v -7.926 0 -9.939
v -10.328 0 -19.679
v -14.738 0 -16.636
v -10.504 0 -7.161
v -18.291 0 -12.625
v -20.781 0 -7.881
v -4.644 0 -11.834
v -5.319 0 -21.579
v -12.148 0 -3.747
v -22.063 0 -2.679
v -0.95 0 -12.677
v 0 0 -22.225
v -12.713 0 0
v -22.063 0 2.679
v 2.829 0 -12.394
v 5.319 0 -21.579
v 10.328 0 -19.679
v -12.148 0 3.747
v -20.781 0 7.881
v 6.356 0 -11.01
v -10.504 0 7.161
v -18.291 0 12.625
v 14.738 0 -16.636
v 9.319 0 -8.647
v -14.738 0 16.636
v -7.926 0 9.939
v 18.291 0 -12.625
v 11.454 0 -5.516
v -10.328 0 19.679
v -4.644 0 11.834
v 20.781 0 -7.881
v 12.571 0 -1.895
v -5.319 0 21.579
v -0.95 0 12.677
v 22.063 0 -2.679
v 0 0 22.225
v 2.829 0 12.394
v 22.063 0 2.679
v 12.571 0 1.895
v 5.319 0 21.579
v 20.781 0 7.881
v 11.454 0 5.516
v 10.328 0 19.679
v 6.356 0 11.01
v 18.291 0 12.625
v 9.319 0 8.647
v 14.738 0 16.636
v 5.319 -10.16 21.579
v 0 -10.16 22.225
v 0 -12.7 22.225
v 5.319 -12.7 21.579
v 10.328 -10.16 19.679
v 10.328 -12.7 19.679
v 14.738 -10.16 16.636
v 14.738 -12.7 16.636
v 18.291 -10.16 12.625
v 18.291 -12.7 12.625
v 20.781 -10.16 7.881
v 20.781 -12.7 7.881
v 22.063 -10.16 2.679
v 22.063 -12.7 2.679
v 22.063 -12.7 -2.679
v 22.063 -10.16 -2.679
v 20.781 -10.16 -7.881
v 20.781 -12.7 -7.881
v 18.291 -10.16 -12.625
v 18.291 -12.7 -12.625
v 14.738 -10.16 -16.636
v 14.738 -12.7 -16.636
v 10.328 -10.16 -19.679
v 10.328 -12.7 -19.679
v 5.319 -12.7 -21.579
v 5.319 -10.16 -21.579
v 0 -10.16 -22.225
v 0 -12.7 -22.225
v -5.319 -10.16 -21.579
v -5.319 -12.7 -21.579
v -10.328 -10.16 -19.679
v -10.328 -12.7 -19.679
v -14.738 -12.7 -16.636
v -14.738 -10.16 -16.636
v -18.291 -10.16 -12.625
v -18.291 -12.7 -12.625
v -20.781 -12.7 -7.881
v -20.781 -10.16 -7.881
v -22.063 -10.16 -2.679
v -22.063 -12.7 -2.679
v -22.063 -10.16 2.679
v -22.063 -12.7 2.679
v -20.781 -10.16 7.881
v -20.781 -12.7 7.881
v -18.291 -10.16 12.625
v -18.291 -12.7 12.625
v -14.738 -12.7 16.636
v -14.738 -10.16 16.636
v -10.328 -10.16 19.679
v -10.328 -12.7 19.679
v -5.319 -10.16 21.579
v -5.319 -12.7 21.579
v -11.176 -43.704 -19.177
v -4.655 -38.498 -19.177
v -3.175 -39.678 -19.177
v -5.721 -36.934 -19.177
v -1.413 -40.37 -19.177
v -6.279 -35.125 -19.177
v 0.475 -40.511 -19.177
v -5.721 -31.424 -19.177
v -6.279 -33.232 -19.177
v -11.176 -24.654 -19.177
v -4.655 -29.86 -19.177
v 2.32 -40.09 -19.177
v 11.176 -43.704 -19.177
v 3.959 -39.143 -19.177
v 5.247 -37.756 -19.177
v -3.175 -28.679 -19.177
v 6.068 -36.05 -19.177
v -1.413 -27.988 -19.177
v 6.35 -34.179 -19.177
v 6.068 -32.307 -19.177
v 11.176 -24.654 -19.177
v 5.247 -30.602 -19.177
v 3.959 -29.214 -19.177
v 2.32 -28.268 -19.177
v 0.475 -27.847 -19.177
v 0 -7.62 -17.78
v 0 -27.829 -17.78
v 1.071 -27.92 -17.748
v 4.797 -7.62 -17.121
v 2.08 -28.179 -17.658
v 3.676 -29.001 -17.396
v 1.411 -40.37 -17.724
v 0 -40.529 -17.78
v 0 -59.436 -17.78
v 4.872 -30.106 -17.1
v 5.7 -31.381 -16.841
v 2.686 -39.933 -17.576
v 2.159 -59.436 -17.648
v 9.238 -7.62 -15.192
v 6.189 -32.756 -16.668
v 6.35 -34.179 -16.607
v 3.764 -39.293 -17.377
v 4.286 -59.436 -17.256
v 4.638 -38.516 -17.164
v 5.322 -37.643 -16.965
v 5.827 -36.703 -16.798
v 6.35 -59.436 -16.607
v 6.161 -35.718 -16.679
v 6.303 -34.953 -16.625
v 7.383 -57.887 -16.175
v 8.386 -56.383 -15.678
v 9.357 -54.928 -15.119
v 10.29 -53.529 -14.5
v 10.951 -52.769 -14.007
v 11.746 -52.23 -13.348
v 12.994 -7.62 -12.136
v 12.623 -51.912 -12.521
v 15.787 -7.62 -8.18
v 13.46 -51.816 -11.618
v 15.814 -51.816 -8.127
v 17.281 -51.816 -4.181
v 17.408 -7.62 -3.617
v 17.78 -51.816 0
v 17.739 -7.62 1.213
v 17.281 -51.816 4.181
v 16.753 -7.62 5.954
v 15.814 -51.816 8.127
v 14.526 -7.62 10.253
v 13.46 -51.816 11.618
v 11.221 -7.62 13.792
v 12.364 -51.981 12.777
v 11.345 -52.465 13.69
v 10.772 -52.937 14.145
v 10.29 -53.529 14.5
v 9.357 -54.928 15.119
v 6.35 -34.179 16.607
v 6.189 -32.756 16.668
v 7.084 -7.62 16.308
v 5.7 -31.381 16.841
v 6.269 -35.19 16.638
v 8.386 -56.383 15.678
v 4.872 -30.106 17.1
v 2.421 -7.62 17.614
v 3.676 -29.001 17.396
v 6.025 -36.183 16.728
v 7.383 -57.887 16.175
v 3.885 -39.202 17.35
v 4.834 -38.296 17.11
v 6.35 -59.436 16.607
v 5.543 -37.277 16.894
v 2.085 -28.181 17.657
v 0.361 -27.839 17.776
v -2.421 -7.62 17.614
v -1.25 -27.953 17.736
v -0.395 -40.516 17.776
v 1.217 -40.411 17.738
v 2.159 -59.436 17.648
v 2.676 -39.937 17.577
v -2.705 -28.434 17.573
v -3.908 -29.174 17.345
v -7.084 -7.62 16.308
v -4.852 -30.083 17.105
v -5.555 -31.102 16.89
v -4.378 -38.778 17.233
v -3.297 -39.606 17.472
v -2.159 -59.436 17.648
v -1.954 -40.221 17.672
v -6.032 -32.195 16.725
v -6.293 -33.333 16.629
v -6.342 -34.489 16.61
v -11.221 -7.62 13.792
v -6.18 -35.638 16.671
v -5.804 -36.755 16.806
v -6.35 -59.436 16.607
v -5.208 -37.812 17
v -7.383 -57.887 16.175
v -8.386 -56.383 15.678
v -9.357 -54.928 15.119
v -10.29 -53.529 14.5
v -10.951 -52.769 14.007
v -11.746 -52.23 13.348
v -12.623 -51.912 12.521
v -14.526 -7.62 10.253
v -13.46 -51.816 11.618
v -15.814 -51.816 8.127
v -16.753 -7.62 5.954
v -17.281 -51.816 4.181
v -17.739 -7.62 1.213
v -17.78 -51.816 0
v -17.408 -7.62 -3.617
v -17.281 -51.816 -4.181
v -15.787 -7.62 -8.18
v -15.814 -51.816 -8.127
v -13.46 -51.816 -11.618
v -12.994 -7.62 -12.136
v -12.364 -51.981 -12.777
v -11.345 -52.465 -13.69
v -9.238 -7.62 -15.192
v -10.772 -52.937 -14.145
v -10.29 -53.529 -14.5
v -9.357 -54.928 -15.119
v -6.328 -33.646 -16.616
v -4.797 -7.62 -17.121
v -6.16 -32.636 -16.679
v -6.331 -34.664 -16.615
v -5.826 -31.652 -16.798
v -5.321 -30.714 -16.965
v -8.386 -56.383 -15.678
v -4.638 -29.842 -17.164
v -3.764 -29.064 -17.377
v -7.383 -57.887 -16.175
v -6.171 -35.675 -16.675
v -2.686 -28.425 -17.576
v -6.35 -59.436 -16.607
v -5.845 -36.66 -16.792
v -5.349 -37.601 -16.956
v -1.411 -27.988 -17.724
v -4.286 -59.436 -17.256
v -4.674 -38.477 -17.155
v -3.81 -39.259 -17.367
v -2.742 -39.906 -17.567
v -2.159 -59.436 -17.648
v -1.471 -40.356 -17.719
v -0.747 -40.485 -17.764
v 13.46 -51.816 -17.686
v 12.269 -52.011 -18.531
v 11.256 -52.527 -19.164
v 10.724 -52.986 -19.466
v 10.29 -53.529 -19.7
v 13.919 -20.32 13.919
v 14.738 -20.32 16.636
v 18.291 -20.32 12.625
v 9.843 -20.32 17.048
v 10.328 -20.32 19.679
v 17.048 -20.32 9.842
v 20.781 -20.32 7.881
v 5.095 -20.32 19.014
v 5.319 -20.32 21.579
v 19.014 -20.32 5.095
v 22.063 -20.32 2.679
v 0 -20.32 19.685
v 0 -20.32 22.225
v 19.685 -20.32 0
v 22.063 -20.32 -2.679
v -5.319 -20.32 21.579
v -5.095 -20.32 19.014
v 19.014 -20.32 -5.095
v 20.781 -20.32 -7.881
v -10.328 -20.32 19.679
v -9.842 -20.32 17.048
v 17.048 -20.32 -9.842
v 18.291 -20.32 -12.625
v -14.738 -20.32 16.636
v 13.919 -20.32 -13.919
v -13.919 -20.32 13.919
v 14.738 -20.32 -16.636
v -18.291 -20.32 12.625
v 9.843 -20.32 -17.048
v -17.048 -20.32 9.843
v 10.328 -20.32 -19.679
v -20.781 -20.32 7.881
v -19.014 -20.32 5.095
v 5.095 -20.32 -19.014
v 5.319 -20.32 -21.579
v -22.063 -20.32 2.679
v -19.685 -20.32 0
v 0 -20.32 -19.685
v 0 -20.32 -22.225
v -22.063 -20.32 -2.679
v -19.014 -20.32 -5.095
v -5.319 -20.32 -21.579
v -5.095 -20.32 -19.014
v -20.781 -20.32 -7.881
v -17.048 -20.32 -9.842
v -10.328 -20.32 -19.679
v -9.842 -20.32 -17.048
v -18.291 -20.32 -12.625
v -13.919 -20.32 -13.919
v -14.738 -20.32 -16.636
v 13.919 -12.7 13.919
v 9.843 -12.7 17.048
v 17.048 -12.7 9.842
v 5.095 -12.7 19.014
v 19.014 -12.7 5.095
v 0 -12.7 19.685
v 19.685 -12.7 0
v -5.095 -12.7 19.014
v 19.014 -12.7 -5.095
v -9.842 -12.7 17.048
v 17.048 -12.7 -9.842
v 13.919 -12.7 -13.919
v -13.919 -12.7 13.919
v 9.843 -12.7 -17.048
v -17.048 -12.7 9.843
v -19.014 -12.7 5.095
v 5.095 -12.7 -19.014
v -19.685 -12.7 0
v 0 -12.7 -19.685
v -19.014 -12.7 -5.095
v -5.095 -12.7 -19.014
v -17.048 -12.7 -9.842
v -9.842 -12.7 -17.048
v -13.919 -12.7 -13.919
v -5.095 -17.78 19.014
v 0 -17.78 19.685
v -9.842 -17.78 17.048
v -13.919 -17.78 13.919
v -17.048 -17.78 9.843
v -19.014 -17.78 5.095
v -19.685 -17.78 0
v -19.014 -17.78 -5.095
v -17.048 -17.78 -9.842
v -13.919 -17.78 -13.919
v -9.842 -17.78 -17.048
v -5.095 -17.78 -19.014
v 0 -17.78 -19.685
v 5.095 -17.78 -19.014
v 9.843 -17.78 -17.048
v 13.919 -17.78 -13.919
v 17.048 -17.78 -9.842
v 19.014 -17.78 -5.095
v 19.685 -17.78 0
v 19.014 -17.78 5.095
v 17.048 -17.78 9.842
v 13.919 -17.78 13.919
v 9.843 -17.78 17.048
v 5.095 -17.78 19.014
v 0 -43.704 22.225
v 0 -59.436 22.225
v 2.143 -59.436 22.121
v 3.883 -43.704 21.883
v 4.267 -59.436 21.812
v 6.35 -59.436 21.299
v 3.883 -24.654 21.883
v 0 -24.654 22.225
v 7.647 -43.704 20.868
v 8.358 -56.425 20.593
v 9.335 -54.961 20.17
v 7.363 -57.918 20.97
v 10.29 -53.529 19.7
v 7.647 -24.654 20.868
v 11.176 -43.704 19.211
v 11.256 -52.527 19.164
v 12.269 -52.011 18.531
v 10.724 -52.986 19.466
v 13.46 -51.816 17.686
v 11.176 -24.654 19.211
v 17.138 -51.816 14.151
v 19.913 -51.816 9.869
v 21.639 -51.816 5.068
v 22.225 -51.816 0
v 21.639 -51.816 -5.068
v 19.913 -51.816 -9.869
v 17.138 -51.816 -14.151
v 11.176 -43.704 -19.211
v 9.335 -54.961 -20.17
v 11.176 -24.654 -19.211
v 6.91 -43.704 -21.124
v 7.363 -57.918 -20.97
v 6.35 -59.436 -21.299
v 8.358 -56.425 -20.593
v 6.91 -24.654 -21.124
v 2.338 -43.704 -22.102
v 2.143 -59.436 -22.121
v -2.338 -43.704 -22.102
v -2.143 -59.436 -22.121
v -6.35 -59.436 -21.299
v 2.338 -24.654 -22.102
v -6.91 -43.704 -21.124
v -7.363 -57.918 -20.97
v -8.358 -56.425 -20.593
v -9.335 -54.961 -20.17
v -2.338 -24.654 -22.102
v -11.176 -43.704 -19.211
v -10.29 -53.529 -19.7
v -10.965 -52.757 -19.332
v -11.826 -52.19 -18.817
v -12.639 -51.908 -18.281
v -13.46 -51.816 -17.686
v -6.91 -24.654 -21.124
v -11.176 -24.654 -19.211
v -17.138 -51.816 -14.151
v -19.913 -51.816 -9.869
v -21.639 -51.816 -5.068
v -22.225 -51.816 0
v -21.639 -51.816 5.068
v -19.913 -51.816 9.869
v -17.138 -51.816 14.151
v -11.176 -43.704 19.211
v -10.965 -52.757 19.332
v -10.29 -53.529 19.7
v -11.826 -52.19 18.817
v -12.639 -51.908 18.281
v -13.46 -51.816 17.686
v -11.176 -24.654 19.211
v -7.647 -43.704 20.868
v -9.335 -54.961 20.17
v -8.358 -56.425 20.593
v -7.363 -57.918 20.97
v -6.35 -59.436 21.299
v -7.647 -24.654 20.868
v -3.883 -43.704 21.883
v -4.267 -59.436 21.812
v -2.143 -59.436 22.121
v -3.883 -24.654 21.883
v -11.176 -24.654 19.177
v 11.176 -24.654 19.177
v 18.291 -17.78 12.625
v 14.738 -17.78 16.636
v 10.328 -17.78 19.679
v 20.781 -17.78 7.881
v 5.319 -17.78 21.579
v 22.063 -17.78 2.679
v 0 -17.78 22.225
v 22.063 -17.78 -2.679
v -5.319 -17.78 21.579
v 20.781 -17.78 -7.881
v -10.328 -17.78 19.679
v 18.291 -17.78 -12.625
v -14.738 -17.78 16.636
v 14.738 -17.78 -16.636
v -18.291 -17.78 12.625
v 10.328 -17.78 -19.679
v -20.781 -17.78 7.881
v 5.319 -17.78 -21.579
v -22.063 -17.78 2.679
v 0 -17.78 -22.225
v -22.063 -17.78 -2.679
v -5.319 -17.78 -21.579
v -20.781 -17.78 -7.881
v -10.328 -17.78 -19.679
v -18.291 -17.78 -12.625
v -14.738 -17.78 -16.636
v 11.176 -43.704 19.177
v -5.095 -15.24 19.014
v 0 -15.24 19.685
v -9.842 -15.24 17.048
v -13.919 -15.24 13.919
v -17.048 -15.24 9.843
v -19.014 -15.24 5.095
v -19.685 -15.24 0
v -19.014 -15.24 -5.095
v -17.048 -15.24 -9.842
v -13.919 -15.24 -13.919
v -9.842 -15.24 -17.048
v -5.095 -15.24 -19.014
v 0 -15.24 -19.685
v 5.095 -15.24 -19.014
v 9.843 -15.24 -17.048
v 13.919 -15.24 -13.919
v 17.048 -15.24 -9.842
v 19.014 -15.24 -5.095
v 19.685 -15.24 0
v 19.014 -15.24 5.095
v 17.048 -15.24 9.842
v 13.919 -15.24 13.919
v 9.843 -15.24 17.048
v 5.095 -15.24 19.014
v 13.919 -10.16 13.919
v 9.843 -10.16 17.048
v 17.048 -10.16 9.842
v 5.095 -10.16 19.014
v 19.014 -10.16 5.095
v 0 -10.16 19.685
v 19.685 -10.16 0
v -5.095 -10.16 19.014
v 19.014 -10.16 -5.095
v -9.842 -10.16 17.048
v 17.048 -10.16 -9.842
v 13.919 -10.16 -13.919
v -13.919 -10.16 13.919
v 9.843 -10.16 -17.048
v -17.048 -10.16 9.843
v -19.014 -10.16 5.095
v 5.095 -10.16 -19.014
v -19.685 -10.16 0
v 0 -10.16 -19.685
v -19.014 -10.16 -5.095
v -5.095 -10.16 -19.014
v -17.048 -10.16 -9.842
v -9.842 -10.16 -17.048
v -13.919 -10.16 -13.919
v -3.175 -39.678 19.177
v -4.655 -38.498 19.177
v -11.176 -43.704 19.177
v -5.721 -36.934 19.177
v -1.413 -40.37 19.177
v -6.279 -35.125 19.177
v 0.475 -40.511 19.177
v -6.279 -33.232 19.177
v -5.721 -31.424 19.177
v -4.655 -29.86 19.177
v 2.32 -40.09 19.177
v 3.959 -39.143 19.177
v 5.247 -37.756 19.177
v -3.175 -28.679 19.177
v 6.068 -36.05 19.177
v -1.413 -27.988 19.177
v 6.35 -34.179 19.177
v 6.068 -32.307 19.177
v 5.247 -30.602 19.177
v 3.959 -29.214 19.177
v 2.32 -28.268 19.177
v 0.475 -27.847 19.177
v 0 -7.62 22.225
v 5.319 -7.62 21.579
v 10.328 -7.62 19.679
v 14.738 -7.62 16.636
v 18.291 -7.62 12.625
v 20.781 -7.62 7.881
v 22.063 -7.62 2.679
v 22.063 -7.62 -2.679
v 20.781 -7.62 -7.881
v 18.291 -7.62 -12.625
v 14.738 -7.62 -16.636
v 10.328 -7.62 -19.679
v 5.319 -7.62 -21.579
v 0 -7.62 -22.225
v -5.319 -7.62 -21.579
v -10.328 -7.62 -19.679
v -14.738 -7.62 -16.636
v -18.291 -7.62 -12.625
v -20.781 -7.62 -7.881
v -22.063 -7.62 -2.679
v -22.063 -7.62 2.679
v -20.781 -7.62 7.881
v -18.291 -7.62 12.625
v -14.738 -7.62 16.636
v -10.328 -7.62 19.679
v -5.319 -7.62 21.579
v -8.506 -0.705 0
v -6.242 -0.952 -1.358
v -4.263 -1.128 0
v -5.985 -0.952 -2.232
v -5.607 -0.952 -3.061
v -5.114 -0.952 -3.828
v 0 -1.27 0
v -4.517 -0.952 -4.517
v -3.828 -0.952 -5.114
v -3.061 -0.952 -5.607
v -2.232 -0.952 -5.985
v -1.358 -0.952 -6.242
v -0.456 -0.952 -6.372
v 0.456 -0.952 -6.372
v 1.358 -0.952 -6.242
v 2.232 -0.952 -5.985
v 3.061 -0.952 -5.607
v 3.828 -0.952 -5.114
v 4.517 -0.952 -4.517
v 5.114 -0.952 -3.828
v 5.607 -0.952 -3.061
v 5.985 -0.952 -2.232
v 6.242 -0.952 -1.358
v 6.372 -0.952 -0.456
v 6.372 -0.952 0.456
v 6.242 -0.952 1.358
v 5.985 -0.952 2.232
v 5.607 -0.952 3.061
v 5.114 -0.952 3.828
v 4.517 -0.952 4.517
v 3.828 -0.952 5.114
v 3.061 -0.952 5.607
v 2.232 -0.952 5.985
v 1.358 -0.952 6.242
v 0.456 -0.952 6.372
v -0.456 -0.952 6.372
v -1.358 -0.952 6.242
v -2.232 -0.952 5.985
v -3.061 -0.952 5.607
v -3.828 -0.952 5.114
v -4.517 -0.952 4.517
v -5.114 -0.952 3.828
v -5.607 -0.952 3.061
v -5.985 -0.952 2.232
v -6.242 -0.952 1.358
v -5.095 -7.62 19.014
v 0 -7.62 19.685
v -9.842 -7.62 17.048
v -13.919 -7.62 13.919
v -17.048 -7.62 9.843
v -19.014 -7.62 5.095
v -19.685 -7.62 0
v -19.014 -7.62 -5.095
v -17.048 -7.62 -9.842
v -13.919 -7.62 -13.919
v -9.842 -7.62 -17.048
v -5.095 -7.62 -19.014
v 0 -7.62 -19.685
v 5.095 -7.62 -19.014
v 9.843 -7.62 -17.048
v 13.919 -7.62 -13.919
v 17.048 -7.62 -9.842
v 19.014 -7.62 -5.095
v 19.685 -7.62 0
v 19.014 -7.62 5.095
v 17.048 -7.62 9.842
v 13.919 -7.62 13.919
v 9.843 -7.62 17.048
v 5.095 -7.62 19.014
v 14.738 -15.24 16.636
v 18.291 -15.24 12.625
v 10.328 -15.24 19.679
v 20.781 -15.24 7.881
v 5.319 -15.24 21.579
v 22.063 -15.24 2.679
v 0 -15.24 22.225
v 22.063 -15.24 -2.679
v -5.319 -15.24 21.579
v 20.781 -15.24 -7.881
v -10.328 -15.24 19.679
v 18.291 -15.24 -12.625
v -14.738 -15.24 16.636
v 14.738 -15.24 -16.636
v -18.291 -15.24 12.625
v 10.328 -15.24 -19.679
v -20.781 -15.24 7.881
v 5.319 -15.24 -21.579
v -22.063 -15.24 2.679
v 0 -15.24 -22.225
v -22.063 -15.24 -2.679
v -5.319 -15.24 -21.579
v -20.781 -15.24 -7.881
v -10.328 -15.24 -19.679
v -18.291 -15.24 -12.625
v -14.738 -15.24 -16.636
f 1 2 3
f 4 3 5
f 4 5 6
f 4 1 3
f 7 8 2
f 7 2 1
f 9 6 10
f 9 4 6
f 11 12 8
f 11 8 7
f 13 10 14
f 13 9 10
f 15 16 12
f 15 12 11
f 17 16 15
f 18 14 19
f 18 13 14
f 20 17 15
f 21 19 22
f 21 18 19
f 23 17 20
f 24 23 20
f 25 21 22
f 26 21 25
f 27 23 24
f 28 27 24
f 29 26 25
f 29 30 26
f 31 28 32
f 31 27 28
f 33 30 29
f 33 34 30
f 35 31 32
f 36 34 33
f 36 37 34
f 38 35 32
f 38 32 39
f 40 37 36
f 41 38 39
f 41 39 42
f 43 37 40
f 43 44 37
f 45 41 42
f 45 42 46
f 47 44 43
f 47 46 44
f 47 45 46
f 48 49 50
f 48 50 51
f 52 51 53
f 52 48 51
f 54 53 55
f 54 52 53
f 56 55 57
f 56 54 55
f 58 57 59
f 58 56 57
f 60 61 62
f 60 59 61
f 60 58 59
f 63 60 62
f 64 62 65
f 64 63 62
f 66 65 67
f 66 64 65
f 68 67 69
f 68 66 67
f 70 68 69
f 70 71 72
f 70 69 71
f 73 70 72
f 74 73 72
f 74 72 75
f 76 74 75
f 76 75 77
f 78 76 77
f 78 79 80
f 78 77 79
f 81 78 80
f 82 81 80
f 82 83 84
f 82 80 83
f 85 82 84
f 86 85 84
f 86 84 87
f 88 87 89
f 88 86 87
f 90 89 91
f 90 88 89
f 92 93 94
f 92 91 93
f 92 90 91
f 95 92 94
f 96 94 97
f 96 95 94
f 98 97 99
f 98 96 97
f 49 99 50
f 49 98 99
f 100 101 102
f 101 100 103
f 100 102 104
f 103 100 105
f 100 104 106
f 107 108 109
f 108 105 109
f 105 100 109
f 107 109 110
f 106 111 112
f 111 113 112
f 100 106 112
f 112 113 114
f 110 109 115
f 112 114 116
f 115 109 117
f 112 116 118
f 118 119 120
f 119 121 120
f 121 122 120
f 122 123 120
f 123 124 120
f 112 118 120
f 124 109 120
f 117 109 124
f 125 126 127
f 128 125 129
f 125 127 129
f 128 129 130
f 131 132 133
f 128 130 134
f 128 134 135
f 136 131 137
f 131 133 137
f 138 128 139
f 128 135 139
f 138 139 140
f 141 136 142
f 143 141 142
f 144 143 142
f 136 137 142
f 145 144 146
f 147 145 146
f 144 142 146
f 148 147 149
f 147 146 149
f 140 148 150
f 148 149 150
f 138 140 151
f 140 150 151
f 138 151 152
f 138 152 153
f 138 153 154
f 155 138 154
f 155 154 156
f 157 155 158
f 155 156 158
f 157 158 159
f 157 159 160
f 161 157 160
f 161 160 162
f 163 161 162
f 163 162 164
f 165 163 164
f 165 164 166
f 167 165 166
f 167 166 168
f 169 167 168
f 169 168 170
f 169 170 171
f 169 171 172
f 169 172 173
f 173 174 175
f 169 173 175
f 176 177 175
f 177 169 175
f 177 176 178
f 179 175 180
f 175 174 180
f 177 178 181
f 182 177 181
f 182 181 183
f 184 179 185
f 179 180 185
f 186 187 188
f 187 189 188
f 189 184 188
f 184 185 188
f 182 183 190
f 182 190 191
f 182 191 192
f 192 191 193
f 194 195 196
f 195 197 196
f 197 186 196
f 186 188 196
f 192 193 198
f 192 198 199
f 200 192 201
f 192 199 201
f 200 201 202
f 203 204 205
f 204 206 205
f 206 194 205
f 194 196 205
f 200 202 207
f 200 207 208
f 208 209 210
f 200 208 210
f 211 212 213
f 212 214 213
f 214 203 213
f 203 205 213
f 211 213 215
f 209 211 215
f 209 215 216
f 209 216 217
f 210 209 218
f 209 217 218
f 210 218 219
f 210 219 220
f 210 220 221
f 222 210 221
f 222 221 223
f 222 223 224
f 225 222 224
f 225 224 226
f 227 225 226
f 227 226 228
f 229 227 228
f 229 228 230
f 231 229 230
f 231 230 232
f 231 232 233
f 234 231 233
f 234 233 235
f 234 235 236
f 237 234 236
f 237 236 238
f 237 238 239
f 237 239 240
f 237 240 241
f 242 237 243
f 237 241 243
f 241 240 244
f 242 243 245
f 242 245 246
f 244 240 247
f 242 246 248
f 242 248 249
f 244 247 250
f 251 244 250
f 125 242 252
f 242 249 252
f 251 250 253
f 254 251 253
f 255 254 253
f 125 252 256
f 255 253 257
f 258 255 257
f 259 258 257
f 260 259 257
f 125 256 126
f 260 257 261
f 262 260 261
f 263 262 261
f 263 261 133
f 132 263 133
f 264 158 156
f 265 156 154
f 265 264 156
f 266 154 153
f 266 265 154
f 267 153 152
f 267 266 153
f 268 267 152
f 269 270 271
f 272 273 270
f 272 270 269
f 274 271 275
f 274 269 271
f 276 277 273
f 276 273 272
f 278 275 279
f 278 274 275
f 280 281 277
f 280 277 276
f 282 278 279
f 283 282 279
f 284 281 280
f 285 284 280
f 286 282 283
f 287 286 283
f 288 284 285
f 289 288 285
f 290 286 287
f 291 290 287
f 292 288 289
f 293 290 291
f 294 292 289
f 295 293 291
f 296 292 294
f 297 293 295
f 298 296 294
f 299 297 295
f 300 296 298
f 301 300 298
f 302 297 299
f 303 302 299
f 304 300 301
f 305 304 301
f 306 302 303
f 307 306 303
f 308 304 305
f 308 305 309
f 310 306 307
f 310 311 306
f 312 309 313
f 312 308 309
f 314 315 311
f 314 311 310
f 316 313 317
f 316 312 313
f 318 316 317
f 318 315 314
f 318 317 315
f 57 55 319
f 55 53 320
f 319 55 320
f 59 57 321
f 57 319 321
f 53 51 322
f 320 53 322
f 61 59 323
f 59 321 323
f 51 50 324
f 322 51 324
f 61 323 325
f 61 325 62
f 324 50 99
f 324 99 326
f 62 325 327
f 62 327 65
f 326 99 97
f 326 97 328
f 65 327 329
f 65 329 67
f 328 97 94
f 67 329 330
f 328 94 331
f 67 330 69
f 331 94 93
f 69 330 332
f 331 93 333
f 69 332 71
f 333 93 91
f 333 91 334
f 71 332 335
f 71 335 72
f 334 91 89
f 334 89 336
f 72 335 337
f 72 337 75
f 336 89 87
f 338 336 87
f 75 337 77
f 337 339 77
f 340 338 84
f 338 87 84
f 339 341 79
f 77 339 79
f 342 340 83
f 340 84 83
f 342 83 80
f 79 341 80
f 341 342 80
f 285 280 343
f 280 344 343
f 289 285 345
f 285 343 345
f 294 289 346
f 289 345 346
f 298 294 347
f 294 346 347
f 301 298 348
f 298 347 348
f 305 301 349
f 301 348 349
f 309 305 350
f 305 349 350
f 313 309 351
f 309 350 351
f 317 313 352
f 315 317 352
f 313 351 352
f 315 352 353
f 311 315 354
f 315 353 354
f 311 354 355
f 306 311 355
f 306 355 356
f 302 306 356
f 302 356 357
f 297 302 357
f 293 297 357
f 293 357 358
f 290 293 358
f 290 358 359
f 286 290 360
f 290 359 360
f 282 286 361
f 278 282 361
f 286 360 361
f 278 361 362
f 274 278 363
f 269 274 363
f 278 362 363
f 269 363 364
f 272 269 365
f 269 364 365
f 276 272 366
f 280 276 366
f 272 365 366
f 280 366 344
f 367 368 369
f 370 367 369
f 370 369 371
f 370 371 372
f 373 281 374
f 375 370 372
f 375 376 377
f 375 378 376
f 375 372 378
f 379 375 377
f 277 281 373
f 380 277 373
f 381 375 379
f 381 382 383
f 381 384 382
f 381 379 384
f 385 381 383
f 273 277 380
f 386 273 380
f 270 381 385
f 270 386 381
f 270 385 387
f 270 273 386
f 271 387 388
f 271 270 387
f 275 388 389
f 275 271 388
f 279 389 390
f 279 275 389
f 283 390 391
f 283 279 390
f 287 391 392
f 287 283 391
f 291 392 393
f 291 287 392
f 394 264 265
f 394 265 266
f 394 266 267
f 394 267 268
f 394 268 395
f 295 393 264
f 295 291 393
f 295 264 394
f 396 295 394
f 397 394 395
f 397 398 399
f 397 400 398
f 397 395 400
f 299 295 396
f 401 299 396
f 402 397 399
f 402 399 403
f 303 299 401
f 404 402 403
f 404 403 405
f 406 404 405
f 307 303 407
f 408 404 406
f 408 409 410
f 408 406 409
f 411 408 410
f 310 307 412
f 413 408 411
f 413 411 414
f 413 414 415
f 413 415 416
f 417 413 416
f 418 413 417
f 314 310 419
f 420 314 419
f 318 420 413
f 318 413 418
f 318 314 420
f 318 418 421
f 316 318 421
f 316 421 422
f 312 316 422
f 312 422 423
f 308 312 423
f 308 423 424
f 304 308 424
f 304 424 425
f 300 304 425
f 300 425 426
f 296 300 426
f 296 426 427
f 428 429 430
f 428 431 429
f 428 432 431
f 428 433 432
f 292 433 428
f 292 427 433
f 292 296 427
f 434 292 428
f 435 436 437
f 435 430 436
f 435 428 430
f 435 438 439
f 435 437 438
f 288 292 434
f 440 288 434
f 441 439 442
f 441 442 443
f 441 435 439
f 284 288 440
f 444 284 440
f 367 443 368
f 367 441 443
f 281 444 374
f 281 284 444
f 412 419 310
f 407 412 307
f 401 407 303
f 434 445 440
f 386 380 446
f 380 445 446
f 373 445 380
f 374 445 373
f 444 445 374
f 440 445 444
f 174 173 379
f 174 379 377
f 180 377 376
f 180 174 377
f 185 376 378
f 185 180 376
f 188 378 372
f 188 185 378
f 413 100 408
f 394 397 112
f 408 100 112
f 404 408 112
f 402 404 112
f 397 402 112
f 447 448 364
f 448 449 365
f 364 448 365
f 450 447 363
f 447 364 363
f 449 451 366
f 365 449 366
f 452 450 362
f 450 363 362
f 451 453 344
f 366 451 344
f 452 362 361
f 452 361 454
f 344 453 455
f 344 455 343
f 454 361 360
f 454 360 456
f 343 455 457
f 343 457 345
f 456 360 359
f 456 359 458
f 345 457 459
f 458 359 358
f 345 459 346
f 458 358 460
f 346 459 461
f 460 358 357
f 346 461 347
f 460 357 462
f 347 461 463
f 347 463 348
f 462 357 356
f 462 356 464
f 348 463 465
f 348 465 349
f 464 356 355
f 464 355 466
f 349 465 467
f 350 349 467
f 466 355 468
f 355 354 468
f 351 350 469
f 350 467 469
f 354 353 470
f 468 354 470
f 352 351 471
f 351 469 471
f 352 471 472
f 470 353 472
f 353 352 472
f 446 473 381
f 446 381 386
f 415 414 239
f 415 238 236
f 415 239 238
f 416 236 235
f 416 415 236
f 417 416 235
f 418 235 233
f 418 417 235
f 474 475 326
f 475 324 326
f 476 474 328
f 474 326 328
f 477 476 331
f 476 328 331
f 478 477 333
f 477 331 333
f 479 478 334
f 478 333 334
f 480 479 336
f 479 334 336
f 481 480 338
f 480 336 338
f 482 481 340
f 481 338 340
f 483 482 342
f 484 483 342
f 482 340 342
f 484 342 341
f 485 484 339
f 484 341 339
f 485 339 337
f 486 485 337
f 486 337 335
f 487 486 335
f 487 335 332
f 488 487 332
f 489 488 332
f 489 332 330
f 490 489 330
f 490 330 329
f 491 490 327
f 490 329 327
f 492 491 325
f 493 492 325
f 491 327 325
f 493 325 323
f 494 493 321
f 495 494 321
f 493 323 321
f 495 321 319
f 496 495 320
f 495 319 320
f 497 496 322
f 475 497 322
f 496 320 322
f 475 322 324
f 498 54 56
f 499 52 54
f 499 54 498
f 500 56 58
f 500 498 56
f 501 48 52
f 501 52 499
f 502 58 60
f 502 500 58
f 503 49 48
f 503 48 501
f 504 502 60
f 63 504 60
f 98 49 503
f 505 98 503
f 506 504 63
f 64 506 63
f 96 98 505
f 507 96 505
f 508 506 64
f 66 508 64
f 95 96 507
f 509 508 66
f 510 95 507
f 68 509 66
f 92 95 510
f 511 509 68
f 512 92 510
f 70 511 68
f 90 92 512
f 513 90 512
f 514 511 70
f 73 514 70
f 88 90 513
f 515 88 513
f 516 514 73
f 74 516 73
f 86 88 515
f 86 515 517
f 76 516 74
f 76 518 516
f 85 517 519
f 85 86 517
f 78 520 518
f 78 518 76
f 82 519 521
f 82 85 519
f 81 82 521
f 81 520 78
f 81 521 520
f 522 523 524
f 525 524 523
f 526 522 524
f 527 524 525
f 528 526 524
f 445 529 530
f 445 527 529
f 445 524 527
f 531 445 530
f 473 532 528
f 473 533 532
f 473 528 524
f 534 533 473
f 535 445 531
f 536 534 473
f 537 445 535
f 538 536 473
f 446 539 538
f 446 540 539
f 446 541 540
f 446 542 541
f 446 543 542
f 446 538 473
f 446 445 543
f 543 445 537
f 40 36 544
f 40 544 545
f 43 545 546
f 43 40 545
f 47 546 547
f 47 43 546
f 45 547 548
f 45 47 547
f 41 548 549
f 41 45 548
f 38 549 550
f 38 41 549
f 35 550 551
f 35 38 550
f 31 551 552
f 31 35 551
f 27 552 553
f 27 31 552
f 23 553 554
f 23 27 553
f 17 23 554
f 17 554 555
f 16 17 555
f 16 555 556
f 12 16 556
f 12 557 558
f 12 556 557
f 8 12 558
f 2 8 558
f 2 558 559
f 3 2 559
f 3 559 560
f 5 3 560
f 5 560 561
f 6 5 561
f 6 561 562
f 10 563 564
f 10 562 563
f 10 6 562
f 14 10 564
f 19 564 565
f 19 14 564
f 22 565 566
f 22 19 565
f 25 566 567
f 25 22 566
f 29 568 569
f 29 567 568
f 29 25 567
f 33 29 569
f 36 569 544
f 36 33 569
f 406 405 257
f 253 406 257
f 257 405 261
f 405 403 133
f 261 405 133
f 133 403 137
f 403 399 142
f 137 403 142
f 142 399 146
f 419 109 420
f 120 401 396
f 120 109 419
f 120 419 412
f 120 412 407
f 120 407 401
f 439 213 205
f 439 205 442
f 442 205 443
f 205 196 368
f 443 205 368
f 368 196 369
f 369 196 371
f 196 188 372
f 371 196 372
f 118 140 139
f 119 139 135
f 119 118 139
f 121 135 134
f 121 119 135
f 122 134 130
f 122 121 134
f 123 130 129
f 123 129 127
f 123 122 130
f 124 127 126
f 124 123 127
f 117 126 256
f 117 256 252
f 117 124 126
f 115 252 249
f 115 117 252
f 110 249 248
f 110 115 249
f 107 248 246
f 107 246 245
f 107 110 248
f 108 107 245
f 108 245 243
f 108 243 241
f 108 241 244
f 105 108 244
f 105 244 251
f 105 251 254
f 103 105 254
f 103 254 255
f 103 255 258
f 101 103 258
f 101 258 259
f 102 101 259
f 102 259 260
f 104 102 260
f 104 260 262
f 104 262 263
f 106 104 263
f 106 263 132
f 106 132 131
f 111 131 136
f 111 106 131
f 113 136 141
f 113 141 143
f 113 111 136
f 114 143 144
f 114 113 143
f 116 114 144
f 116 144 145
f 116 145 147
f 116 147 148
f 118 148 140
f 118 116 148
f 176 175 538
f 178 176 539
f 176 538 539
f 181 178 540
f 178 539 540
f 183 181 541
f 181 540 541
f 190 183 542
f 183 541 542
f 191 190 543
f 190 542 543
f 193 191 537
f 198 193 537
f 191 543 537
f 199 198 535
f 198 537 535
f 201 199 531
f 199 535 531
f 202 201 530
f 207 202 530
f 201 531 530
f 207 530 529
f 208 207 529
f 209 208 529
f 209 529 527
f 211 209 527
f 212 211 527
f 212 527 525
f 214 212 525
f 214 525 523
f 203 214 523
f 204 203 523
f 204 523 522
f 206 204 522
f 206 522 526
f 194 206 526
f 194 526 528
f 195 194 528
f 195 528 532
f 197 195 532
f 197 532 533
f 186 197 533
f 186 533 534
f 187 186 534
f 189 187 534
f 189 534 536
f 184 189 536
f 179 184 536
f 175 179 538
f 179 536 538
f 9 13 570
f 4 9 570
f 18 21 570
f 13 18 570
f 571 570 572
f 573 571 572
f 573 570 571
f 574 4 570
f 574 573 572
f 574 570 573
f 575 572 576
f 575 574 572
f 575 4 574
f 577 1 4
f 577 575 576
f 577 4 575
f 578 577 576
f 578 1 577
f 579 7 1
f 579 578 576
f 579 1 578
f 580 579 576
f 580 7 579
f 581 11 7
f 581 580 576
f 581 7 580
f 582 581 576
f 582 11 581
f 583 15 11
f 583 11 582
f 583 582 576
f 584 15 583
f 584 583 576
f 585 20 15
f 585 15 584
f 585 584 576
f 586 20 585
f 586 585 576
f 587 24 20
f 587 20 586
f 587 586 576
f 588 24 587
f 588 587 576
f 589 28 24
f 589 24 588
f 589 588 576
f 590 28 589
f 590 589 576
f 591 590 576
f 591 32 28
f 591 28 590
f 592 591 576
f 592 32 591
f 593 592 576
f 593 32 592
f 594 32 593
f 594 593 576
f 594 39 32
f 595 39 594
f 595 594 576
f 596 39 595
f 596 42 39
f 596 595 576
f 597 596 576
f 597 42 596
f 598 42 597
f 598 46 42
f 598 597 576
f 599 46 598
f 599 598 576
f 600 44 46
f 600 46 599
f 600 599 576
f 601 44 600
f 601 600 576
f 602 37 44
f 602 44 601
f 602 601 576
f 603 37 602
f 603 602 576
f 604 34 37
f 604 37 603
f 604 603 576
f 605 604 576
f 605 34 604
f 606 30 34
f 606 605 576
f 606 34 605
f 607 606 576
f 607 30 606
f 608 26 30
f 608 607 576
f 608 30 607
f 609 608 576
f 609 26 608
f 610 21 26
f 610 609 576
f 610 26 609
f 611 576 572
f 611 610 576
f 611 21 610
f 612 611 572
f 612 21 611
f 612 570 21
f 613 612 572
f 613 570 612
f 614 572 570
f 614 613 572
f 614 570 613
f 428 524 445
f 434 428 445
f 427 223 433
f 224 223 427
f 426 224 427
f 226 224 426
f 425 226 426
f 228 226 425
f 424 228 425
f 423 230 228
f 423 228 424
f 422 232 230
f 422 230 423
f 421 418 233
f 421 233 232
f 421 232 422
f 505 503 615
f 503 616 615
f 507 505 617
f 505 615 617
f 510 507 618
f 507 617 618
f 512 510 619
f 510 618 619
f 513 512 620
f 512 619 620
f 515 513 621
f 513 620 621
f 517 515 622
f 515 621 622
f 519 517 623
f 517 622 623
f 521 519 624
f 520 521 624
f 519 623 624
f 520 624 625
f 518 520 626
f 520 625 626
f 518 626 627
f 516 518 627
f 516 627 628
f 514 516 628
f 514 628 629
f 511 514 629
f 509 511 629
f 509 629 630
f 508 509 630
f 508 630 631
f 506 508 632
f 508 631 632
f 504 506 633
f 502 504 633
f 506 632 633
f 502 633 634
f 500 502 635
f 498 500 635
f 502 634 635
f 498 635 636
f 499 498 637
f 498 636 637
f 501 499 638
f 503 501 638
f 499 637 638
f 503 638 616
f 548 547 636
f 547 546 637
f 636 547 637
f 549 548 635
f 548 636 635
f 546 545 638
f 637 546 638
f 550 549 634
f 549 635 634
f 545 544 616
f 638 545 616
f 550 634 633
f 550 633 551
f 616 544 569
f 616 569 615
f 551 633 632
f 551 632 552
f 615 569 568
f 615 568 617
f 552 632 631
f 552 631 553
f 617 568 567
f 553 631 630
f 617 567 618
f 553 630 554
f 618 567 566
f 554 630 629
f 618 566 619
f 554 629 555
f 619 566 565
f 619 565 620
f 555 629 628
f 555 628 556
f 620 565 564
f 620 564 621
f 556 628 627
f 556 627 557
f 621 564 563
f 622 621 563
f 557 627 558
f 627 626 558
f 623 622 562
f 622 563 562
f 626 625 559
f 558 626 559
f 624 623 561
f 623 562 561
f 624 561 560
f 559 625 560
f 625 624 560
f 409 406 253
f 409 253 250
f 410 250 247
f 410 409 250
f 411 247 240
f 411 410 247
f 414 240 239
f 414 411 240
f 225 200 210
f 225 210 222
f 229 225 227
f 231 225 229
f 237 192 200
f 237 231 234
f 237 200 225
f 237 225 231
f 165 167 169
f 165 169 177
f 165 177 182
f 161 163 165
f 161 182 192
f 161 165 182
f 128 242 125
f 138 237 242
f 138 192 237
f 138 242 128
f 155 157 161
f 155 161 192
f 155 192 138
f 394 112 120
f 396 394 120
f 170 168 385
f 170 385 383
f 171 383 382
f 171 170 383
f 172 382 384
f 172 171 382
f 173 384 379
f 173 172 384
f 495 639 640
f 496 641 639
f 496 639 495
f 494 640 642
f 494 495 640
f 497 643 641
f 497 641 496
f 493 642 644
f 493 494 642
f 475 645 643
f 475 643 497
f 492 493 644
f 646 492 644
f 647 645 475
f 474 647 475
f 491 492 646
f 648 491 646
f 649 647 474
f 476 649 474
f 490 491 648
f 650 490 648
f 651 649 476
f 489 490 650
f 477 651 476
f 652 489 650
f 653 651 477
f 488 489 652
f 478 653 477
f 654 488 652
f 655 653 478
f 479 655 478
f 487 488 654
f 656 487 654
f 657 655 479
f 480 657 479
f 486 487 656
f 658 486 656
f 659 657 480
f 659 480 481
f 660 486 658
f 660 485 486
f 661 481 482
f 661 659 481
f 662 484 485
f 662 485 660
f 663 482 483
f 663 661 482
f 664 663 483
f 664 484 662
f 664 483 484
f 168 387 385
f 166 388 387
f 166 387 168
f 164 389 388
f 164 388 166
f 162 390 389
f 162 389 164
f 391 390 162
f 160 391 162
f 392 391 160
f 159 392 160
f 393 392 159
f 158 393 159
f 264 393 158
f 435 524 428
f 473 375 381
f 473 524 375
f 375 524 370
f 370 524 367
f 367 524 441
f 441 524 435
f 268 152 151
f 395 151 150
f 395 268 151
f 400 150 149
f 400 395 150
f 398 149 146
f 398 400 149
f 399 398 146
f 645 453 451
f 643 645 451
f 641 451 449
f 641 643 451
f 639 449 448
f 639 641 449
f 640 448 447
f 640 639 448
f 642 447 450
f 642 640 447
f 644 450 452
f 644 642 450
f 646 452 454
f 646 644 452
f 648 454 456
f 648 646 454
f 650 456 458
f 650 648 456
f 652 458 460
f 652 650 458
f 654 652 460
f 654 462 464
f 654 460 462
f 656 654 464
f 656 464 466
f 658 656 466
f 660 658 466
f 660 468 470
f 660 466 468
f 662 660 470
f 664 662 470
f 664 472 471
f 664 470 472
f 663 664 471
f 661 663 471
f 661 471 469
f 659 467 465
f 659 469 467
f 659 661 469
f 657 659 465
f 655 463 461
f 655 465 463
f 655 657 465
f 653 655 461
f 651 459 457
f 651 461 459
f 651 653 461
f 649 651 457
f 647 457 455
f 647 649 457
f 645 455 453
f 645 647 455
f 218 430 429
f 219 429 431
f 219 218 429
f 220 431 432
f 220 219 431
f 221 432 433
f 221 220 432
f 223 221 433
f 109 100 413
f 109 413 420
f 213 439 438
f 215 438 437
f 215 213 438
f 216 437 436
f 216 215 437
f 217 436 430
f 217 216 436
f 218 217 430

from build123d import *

# Parameters (mm, degrees)
SKETCH4_R               = 22.225
BOSS_EXTRUDE1_DEPTH     = 59.436
SKETCH5_W               = 2.54
SKETCH5_H               = 2.54
SKETCH6_R               = 17.78
CUT_EXTRUDE1_DEPTH      = 51.816
CUT_EXTRUDE3_DEPTH      = 68.23495628
CUT_EXTRUDE3_DEPTH_BACK = 68.23495628
CUT_EXTRUDE5_REACH      = 77.768
CUT_EXTRUDE5_END_RADIUS = 22.225
SKETCH12_W              = 22.352
SKETCH12_H              = 19.05
SKETCH13_R              = 6.35
CUT_EXTRUDE6_DEPTH      = 5.842


with BuildPart() as part:
    # Sketch4 → Boss-Extrude1 (new body)
    with BuildSketch(Plane(origin=(0, 0, 0), x_dir=(1, 0, 0), z_dir=(0, 1, 0))):
        with Locations(Location((0, 0, 0), (0, 0, 270))):
            Circle(SKETCH4_R)
    extrude(amount=-BOSS_EXTRUDE1_DEPTH)

    # Sketch5 → Cut-Revolve1 (revolve, cut)
    with BuildSketch(Plane.XY, mode=Mode.PRIVATE) as cut_revolve1_sk:
        with Locations((20.955, -8.89)):
            Rectangle(SKETCH5_W, SKETCH5_H)
        with Locations((20.955, -13.97)):
            Rectangle(SKETCH5_W, SKETCH5_H)
        with Locations((20.955, -19.05)):
            Rectangle(SKETCH5_W, SKETCH5_H)
    revolve(cut_revolve1_sk.sketch.rotate(Axis((0, 26.260199794, 0), (0, -1, 0)), 90), axis=Axis((0, 26.260199794, 0), (0, -1, 0)), mode=Mode.SUBTRACT)

    # Sketch6 → Cut-Extrude1 (cut)
    with BuildSketch(Plane.XZ.offset(59.436)):
        with Locations(Location((0, 0, 0), (0, 0, 270))):
            Circle(SKETCH6_R)
    extrude(amount=-CUT_EXTRUDE1_DEPTH, mode=Mode.SUBTRACT)

    # Sketch7 → Cut-Extrude3 (cut, two sides: drawn at the far end of the back side and taken through both)
    with BuildSketch(Plane.XY.offset(-CUT_EXTRUDE3_DEPTH_BACK)):
        with BuildLine():
            Line((22.225, -59.436), (22.225, -51.816))
            Line((22.225, -51.816), (13.459535823, -51.816))
            ThreePointArc((13.459535823, -51.816), (11.659833258, -52.274635573), (10.289790639, -53.52853315))
            Line((10.289790639, -53.52853315), (6.35, -59.436))
            Line((6.35, -59.436), (22.225, -59.436))
        make_face()
        with BuildLine():
            Line((-22.225, -59.436), (-6.35, -59.436))
            Line((-6.35, -59.436), (-10.289790639, -53.52853315))
            ThreePointArc((-10.289790639, -53.52853315), (-11.659833258, -52.274635573), (-13.459535823, -51.816))
            Line((-13.459535823, -51.816), (-22.225, -51.816))
            Line((-22.225, -51.816), (-22.225, -59.436))
        make_face()
    extrude(amount=CUT_EXTRUDE3_DEPTH + CUT_EXTRUDE3_DEPTH_BACK, mode=Mode.SUBTRACT)

    # Cut-Extrude5: up to this cylinder (the profile starts inside it)
    cut_extrude5_end = Plane(origin=(0, -34.178757, 0), z_dir=(0, 1, 0)) * Cylinder(CUT_EXTRUDE5_END_RADIUS, 200.986, mode=Mode.PRIVATE)
    # Sketch12 → Cut-Extrude5 (cut, up to the surface)
    with BuildSketch(Plane.XY.offset(19.177), mode=Mode.PRIVATE) as cut_extrude5_sk1:
        with Locations((0, -34.17875674)):
            Rectangle(SKETCH12_W, SKETCH12_H)
    cut_extrude5_tool1 = extrude(cut_extrude5_sk1.sketch, amount=CUT_EXTRUDE5_REACH, mode=Mode.PRIVATE) & cut_extrude5_end
    cut_extrude5 = cut_extrude5_tool1.solids().sort_by_distance((0, -34.178757, 19.177))[0]
    add(cut_extrude5, mode=Mode.SUBTRACT)

    # Sketch13 → Cut-Extrude6 (cut)
    with BuildSketch(Plane.XY.offset(19.177)):
        with Locations((0, -34.17875674)):
            Circle(SKETCH13_R)
    cut_extrude6 = extrude(amount=-CUT_EXTRUDE6_DEPTH, mode=Mode.SUBTRACT)

    # Mirror1: Cut-Extrude5, Cut-Extrude6 across plane
    add(cut_extrude5.mirror(Plane.XY), mode=Mode.SUBTRACT)
    add(cut_extrude6.mirror(Plane.XY), mode=Mode.SUBTRACT)

    # Sketch16 → Cut-Revolve2 (revolve, cut)
    with BuildSketch(Plane.XY, mode=Mode.PRIVATE) as cut_revolve2_sk:
        with BuildLine():
            Line((0, 0), (0, -1.27))
            ThreePointArc((0, -1.27), (6.387986381, -0.951711763), (12.712693656, 0))
            Line((12.712693656, 0), (0, 0))
        make_face()
    revolve(cut_revolve2_sk.sketch.rotate(Axis((0, 62.992, 0), (0, -1, 0)), 180), axis=Axis((0, 62.992, 0), (0, -1, 0)), mode=Mode.SUBTRACT)


solid = part.part
